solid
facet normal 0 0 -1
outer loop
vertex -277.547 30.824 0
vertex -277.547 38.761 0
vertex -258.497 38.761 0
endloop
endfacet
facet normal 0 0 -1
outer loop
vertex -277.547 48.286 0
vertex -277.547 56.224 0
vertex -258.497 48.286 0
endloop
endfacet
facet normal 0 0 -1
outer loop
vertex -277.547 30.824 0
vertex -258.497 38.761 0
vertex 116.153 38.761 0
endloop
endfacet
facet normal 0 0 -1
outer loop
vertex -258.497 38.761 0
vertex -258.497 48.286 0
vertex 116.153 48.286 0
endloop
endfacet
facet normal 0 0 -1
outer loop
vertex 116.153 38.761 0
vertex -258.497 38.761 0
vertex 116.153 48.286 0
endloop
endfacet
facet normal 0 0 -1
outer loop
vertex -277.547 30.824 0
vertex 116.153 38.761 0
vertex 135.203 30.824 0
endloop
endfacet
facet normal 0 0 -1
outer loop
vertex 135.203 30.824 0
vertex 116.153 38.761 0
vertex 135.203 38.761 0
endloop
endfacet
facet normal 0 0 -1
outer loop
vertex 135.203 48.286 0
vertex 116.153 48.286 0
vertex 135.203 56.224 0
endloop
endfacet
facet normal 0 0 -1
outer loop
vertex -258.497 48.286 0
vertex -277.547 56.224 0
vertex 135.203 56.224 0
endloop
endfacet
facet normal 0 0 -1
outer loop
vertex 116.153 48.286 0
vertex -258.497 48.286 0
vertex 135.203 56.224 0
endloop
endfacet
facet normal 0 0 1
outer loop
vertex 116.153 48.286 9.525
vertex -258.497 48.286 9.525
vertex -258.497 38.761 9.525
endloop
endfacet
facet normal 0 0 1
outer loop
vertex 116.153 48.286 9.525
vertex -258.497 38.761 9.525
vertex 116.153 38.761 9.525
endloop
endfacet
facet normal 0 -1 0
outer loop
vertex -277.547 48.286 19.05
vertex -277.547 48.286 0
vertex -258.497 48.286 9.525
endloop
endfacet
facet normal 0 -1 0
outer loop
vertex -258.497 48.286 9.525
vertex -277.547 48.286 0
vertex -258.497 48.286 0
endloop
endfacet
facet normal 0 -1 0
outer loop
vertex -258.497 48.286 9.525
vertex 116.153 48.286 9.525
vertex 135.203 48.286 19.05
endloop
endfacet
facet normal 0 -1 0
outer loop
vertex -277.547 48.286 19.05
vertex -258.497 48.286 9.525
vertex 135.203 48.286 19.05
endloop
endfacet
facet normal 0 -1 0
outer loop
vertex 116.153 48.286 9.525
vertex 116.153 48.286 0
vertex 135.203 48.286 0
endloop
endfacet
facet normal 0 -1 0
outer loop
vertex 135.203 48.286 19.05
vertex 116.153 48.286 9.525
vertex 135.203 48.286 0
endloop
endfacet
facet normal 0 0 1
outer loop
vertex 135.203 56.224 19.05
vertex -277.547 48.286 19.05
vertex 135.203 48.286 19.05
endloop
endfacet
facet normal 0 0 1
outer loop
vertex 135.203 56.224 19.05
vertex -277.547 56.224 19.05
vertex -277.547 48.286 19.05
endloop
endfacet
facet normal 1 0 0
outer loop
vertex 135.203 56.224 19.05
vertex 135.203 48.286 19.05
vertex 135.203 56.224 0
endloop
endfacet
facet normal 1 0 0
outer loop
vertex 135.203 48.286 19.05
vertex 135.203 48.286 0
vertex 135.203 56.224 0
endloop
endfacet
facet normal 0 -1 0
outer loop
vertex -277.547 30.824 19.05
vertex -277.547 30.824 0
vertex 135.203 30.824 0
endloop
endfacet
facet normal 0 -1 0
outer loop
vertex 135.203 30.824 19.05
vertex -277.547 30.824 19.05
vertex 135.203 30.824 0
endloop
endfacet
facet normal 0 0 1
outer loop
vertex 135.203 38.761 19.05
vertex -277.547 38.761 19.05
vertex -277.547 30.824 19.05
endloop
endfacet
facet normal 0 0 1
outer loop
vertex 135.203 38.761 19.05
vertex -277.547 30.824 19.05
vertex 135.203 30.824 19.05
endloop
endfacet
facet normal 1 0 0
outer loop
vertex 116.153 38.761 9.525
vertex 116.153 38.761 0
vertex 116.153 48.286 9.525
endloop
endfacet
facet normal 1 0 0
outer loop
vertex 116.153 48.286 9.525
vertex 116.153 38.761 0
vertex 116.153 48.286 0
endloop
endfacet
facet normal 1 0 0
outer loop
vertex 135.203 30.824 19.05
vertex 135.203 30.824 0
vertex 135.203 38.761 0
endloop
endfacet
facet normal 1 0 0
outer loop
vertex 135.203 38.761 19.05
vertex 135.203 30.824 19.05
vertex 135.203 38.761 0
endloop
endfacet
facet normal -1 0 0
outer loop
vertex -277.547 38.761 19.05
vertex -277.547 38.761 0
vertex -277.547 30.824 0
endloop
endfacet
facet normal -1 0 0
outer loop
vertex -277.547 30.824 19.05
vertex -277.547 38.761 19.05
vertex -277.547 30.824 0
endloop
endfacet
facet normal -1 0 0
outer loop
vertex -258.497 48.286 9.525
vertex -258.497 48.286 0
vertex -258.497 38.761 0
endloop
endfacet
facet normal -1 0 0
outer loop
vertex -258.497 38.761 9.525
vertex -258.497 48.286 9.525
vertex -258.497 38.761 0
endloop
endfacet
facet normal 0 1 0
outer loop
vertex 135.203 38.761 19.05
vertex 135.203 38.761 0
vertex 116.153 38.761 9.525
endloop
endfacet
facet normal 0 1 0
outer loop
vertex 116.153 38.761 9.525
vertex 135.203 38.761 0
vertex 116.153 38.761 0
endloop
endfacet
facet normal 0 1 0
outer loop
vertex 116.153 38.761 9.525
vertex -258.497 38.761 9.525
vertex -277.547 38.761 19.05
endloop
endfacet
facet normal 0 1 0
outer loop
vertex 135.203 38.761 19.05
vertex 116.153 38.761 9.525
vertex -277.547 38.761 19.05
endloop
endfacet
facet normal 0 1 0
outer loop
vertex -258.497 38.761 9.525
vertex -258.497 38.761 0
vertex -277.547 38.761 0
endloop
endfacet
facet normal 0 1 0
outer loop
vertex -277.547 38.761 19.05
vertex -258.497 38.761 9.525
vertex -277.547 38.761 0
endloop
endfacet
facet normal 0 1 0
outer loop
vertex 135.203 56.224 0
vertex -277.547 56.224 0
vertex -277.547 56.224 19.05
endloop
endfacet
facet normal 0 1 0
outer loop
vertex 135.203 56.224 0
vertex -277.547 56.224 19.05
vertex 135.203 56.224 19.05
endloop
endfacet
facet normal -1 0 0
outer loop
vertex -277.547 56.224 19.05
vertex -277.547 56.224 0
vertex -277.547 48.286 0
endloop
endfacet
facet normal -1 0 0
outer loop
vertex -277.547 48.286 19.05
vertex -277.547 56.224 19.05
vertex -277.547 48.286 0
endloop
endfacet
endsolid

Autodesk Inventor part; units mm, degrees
ref_plane "YZ Plane" through (0, 0, 0) normal (1, 0, 0) x (0, 1, 0)
ref_plane "XZ Plane" through (0, 0, 0) normal (0, 1, 0) x (-1, 0, 0)
ref_plane "XY Plane" through (0, 0, 0) normal (0, 0, 1) x (1, 0, 0)
sketch "Sketch1" plane through (0, 0, 0) normal (0, 0, 1) x (1, 0, 0)
  line L0 (-277.5467, 56.2236) -> (135.2033, 56.2236)
  line L1 (-277.5467, 56.2236) -> (-277.5467, 48.2861)
  line L2 (-277.5467, 48.2861) -> (-258.4967, 48.2861)
  line L3 (-258.4967, 48.2861) -> (-258.4967, 38.7611)
  line L4 (-258.4967, 38.7611) -> (-277.5467, 38.7611)
  line L5 (-277.5467, 38.7611) -> (-277.5467, 30.8236)
  line L6 (-277.5467, 30.8236) -> (135.2033, 30.8236)
  line L7 (135.2033, 30.8236) -> (135.2033, 38.7611)
  line L8 (135.2033, 38.7611) -> (116.1533, 38.7611)
  line L9 (116.1533, 38.7611) -> (116.1533, 48.2861)
  line L10 (116.1533, 48.2861) -> (135.2033, 48.2861)
  line L11 (135.2033, 48.2861) -> (135.2033, 56.2236)
  point P0 (0, 0)
  dimension "d0" = 412.75
  dimension "d1" = 7.9375
  dimension "d2" = 7.9375
  dimension "d3" = 9.525
  dimension "d4" = 7.9375
  dimension "d5" = 9.525
  dimension "d6" = 19.05
  dimension "d7" = 19.05
  dimension "d8" = 19.05
  dimension "d14" = 412.75
extrude "Extrusion1" add sketch "Sketch1" along normal blind 19.05
sketch "Sketch2" plane through (0, 0, 19.05) normal (0, 0, 1) x (1, 0, 0)
  line L0 (-258.4967, 48.2861) -> (116.1533, 48.2861)
  line L1 (116.1533, 48.2861) -> (116.1533, 38.7611)
  line L2 (116.1533, 38.7611) -> (-258.4967, 38.7611)
  line L3 (-258.4967, 38.7611) -> (-258.4967, 48.2861)
  point P0 (0, 0)
extrude "Extrusion2" cut sketch "Sketch2" against normal blind 9.525
equation "\"d14\" = d0"
properties part number "top_cover_end"
